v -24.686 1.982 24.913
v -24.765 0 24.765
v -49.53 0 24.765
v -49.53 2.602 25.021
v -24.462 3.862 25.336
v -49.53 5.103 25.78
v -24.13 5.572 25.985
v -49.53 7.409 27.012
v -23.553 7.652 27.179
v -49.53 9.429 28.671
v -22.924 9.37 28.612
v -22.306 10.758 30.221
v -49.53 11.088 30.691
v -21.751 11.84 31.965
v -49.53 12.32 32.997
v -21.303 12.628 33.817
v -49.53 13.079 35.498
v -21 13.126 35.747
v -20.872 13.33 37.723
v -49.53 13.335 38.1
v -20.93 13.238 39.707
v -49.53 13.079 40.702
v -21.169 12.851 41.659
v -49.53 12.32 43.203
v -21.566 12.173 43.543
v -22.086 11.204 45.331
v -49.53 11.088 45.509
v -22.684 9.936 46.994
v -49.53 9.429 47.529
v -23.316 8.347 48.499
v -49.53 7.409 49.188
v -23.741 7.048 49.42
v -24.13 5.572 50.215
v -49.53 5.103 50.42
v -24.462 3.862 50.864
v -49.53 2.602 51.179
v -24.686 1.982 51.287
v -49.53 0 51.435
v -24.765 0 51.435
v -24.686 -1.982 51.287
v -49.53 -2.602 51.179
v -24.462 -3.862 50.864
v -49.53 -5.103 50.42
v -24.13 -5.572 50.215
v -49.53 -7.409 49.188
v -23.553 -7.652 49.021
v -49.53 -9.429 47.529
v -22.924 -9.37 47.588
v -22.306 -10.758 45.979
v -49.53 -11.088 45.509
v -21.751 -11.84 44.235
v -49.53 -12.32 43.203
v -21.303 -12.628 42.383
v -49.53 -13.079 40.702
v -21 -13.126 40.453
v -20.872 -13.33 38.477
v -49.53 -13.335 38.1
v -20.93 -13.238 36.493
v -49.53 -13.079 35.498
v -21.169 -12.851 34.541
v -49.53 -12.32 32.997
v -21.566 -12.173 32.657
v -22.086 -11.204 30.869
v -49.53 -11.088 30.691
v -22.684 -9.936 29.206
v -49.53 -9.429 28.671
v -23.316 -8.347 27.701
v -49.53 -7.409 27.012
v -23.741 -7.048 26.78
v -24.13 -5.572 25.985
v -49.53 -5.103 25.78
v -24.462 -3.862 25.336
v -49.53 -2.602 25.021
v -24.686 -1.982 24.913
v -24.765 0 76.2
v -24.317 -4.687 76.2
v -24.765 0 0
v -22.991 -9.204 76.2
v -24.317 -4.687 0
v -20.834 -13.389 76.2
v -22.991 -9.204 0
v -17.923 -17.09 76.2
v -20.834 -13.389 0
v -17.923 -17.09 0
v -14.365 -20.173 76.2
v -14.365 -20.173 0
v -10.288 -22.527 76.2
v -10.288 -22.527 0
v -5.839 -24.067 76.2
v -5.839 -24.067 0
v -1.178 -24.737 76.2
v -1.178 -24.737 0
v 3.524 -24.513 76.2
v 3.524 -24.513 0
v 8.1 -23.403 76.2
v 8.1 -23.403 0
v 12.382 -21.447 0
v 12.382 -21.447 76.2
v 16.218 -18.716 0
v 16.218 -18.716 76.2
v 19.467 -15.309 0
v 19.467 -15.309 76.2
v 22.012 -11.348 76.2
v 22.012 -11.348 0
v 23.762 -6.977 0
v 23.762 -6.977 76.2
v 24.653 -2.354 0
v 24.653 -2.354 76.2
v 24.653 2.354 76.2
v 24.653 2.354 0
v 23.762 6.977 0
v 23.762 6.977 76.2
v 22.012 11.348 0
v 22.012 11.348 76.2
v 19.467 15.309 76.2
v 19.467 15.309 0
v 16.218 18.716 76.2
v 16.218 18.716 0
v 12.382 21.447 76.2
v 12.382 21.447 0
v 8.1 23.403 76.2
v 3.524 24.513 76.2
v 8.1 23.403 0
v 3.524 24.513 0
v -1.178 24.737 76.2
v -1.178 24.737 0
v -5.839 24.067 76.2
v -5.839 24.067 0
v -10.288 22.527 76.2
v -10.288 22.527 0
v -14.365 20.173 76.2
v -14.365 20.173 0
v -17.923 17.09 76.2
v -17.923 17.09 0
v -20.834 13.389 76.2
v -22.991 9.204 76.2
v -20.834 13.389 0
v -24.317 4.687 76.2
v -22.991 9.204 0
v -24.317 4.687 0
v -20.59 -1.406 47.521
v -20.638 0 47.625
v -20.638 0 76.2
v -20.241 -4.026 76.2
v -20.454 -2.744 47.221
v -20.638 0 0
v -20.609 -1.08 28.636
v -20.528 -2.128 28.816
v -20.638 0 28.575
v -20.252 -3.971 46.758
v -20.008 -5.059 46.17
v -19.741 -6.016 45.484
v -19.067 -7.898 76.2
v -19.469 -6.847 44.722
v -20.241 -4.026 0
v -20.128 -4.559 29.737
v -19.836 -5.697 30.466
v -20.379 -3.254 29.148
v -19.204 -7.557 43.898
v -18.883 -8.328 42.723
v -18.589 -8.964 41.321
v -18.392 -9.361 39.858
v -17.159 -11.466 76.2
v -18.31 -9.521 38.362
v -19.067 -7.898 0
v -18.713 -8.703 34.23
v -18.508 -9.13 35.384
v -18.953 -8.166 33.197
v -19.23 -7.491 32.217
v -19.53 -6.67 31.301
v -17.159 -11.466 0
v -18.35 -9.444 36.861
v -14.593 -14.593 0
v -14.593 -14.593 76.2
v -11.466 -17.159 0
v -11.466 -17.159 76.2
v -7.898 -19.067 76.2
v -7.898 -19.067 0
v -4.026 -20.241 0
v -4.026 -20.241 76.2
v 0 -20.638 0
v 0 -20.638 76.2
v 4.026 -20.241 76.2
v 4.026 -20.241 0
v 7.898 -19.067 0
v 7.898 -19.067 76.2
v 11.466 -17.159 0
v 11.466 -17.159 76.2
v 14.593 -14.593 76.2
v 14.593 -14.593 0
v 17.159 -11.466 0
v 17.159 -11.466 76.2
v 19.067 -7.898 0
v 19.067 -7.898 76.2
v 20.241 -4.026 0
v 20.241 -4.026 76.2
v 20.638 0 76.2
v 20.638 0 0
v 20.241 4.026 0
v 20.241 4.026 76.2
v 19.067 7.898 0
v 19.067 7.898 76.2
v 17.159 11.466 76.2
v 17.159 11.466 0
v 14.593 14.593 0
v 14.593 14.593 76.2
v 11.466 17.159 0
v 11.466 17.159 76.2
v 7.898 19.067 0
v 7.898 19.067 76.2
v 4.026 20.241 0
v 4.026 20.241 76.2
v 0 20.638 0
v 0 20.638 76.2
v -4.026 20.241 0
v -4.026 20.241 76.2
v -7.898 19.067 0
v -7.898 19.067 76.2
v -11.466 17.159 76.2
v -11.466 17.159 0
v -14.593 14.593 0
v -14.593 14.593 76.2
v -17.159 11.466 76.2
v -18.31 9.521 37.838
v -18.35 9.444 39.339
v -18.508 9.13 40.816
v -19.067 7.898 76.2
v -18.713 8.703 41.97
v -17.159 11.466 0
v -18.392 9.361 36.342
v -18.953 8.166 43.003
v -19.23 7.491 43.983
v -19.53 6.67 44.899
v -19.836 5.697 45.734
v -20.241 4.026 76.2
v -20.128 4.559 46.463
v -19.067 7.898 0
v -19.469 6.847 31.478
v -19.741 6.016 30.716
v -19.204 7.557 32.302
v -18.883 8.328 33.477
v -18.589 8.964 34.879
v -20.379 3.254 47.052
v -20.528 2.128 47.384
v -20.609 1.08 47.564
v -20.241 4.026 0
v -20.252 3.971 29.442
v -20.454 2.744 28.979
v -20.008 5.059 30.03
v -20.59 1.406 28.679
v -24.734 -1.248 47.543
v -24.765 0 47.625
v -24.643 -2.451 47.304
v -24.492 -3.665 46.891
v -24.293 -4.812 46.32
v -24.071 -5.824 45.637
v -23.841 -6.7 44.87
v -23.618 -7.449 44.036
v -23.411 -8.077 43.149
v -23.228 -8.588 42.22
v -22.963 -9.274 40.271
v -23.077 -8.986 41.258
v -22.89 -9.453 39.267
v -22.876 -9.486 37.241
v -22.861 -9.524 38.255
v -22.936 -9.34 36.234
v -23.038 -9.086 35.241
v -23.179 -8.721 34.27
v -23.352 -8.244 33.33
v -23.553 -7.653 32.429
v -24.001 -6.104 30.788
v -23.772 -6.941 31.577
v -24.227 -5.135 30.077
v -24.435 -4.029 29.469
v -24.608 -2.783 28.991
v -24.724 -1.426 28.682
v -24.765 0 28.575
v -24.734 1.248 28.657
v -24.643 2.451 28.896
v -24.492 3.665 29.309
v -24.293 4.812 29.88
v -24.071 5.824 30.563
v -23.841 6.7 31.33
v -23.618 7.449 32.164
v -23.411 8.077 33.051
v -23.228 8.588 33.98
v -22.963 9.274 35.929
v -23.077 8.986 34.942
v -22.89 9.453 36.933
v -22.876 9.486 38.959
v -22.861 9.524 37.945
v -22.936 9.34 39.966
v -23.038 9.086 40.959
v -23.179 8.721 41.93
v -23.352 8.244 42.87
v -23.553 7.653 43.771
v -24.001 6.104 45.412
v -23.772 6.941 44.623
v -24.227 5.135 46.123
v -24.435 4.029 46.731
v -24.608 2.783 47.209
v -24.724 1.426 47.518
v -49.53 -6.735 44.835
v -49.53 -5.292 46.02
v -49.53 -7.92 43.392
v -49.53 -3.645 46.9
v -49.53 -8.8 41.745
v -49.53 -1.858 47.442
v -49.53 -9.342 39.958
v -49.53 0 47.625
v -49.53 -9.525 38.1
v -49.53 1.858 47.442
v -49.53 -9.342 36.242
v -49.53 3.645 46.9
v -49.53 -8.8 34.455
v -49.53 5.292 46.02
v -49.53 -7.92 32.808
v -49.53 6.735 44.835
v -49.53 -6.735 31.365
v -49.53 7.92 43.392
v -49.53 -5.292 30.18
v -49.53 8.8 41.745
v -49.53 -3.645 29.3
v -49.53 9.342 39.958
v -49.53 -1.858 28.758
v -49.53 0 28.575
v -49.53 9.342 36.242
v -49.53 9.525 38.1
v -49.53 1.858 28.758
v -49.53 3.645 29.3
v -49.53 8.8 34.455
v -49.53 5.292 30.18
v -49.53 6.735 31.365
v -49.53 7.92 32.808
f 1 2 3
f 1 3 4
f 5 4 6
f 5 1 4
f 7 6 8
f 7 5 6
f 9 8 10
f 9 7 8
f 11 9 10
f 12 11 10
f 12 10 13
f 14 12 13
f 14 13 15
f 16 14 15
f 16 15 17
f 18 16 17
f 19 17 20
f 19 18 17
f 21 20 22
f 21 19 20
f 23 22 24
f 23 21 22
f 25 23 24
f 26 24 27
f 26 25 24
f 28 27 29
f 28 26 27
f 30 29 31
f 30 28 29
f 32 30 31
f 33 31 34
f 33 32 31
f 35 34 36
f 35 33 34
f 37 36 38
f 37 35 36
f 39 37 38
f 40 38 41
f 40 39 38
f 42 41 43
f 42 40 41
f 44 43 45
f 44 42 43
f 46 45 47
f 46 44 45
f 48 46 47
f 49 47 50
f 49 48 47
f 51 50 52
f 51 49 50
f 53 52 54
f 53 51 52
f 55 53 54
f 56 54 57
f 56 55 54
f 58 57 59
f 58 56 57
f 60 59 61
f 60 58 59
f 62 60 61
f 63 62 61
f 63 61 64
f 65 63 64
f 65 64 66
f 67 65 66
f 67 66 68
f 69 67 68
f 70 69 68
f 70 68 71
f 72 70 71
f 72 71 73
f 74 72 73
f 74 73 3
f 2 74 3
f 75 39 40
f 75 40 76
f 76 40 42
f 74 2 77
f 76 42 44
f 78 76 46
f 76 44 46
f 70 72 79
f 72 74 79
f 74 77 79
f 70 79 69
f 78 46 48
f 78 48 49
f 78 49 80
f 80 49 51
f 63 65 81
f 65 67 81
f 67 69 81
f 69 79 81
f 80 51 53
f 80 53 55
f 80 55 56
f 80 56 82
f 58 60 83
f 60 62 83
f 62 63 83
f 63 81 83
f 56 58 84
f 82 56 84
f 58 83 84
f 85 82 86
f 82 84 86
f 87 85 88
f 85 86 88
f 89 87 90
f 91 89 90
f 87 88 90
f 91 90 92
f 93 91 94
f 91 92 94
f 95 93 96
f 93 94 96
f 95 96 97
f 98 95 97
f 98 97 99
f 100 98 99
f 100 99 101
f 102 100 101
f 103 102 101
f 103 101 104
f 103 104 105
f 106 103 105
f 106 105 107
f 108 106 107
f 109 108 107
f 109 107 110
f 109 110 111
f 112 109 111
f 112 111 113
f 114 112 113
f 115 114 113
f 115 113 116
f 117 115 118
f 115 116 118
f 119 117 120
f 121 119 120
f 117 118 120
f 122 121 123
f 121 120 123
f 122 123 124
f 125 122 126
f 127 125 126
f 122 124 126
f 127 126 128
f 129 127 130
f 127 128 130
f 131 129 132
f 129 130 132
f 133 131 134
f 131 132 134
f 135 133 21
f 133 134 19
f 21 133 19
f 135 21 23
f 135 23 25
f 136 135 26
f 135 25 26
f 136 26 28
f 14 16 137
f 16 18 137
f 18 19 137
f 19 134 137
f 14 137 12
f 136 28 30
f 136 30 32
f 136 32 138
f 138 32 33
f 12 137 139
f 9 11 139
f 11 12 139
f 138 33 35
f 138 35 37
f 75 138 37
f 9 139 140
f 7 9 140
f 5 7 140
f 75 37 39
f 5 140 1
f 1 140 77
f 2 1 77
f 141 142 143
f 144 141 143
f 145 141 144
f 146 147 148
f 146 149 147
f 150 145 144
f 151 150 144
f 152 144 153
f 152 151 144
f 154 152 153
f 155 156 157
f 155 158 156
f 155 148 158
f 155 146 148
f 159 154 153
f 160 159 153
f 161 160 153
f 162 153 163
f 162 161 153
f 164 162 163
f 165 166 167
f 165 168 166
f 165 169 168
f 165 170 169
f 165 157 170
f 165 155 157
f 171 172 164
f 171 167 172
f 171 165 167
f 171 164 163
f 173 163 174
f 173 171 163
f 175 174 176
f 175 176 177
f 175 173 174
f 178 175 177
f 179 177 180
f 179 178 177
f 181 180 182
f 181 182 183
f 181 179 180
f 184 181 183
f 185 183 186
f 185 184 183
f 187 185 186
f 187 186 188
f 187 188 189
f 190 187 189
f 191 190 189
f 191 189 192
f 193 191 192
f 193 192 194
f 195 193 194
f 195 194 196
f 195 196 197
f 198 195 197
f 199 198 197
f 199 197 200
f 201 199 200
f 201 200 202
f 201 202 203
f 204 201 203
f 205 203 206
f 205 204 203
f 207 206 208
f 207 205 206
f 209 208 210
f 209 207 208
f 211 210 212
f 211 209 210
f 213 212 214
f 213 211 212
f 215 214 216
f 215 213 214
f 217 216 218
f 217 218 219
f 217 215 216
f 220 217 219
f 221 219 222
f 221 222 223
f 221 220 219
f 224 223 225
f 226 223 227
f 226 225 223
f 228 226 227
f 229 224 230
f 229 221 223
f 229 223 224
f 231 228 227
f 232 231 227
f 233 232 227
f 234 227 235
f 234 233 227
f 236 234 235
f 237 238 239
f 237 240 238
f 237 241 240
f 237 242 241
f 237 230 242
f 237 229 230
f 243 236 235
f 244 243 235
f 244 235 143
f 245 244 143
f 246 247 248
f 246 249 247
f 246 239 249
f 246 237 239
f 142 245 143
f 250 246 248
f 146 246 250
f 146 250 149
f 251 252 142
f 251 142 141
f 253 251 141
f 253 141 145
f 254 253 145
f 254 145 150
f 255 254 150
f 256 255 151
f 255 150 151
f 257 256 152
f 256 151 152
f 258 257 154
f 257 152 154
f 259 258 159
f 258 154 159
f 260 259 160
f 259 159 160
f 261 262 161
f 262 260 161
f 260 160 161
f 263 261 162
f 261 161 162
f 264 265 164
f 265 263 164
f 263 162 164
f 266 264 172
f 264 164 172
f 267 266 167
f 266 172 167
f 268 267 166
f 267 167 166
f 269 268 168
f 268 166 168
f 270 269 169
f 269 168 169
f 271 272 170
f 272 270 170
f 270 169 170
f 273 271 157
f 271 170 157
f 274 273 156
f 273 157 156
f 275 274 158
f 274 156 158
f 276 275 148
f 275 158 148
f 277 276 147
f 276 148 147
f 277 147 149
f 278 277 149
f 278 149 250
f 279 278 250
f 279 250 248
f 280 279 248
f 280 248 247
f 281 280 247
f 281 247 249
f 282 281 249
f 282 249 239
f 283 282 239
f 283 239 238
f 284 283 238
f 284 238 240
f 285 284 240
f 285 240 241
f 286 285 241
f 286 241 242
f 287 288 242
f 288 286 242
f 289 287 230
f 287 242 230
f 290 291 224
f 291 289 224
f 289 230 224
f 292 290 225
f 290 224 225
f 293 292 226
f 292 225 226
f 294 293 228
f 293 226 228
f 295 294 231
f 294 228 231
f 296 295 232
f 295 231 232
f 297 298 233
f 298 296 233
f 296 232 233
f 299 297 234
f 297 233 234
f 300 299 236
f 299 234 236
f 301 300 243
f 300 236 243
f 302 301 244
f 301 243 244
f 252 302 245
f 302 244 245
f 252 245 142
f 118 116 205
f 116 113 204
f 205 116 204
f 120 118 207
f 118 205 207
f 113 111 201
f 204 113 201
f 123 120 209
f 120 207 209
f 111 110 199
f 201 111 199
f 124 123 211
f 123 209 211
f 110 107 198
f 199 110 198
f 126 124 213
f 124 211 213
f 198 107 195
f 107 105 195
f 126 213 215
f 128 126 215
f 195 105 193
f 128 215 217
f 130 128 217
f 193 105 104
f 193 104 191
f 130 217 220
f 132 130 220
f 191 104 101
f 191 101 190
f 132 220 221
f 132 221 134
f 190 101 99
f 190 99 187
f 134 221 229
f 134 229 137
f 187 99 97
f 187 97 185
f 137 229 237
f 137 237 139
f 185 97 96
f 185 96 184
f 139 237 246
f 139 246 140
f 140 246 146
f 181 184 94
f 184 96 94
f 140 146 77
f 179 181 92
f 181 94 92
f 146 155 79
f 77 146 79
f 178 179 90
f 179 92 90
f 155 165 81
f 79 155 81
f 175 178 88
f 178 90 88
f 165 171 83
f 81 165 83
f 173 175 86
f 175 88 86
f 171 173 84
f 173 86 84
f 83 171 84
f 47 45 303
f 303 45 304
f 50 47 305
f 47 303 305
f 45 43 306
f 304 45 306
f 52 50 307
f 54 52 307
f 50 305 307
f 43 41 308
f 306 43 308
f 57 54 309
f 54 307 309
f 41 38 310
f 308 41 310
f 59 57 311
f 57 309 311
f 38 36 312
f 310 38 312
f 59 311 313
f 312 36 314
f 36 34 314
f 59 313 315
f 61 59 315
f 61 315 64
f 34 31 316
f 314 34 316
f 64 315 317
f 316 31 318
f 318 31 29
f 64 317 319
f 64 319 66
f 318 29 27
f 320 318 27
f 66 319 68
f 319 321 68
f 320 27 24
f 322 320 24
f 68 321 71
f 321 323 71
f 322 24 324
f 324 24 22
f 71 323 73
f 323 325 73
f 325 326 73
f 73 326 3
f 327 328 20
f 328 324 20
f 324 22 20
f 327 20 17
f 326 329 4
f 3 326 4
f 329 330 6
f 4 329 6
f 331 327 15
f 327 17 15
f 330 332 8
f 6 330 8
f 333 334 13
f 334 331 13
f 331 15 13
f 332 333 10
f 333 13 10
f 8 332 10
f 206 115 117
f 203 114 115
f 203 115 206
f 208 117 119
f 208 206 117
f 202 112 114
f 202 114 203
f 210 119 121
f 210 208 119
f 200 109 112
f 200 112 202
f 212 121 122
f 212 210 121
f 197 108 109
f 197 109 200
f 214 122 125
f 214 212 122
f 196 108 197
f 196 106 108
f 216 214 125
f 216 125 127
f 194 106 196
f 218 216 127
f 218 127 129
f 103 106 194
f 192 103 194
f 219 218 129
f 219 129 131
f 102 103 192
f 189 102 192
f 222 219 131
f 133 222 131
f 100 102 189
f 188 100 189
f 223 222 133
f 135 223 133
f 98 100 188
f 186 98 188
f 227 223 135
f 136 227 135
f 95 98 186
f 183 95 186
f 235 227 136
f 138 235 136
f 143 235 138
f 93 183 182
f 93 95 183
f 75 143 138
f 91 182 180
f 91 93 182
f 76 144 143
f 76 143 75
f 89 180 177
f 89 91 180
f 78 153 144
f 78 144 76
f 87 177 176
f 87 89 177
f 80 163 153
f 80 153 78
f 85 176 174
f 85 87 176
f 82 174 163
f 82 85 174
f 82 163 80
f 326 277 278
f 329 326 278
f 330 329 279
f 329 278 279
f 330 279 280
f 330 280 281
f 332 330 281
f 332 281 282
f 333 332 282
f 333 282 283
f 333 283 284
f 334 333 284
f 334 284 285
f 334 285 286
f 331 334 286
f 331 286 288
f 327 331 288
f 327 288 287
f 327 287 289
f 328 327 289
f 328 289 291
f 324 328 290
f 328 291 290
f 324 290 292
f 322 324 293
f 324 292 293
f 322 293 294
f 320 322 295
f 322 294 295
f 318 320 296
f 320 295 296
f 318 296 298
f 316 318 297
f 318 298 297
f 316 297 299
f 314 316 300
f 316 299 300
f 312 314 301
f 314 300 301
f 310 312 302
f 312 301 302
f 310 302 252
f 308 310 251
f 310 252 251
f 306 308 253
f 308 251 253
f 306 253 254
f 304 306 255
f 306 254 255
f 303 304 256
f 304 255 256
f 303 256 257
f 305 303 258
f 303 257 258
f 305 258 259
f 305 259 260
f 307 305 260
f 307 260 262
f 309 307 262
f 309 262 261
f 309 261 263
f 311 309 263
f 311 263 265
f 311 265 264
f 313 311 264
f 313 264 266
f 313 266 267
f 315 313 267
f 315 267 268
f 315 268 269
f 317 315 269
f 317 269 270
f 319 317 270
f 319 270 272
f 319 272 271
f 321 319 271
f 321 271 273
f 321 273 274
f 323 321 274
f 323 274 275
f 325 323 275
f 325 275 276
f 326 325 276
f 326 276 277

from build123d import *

# Parameters (mm, degrees)
SKETCH1_R           = 24.765
SKETCH1_R_2         = 20.6375
BOSS_EXTRUDE1_DEPTH = 76.2
SKETCH2_R           = 9.525
CUT_EXTRUDE1_DEPTH  = 76.2
SKETCH3_R           = 13.335
SKETCH3_R_2         = 9.525
BOSS_EXTRUDE2_DEPTH = 25.4
BOSS_EXTRUDE3_START = 3.4
SKETCH4_R           = 13.335
SKETCH4_R_2         = 9.525
BOSS_EXTRUDE3_DEPTH = 3.4


with BuildPart() as part:
    # Sketch1 → Boss-Extrude1 (new body)
    with BuildSketch(Plane.XY):
        with Locations(Location((0, 0, 0), (0, 0, 180))):
            Circle(SKETCH1_R)
        with Locations(Location((0, 0, 0), (0, 0, 180))):
            Circle(SKETCH1_R_2, mode=Mode.SUBTRACT)
    extrude(amount=BOSS_EXTRUDE1_DEPTH)

    # Sketch2 → Cut-Extrude1 (cut)
    with BuildSketch(Plane(origin=(0, 0, 0), x_dir=(0, 0, -1), z_dir=(1, 0, 0))):
        with Locations(Location((-38.1, 0, 0), (0, 0, 180))):
            Circle(SKETCH2_R)
    extrude(amount=-CUT_EXTRUDE1_DEPTH, mode=Mode.SUBTRACT)

    # Sketch3 → Boss-Extrude2 (add)
    with BuildSketch(Plane(origin=(-24.13, 0, 0), x_dir=(0, 0, -1), z_dir=(1, 0, 0))):
        with Locations((-38.1, 0)):
            Circle(SKETCH3_R)
        with Locations((-38.1, 0)):
            Circle(SKETCH3_R_2, mode=Mode.SUBTRACT)
    extrude(amount=-BOSS_EXTRUDE2_DEPTH)

    # Sketch4 → Boss-Extrude3 (add)
    with BuildSketch(Plane(origin=(-24.13, 0, 0), x_dir=(0, 0, -1), z_dir=(1, 0, 0)).offset(BOSS_EXTRUDE3_START)):
        with Locations((-38.1, 0)):
            Circle(SKETCH4_R)
        with Locations((-38.1, 0)):
            Circle(SKETCH4_R_2, mode=Mode.SUBTRACT)
    extrude(amount=-BOSS_EXTRUDE3_DEPTH)


solid = part.part
